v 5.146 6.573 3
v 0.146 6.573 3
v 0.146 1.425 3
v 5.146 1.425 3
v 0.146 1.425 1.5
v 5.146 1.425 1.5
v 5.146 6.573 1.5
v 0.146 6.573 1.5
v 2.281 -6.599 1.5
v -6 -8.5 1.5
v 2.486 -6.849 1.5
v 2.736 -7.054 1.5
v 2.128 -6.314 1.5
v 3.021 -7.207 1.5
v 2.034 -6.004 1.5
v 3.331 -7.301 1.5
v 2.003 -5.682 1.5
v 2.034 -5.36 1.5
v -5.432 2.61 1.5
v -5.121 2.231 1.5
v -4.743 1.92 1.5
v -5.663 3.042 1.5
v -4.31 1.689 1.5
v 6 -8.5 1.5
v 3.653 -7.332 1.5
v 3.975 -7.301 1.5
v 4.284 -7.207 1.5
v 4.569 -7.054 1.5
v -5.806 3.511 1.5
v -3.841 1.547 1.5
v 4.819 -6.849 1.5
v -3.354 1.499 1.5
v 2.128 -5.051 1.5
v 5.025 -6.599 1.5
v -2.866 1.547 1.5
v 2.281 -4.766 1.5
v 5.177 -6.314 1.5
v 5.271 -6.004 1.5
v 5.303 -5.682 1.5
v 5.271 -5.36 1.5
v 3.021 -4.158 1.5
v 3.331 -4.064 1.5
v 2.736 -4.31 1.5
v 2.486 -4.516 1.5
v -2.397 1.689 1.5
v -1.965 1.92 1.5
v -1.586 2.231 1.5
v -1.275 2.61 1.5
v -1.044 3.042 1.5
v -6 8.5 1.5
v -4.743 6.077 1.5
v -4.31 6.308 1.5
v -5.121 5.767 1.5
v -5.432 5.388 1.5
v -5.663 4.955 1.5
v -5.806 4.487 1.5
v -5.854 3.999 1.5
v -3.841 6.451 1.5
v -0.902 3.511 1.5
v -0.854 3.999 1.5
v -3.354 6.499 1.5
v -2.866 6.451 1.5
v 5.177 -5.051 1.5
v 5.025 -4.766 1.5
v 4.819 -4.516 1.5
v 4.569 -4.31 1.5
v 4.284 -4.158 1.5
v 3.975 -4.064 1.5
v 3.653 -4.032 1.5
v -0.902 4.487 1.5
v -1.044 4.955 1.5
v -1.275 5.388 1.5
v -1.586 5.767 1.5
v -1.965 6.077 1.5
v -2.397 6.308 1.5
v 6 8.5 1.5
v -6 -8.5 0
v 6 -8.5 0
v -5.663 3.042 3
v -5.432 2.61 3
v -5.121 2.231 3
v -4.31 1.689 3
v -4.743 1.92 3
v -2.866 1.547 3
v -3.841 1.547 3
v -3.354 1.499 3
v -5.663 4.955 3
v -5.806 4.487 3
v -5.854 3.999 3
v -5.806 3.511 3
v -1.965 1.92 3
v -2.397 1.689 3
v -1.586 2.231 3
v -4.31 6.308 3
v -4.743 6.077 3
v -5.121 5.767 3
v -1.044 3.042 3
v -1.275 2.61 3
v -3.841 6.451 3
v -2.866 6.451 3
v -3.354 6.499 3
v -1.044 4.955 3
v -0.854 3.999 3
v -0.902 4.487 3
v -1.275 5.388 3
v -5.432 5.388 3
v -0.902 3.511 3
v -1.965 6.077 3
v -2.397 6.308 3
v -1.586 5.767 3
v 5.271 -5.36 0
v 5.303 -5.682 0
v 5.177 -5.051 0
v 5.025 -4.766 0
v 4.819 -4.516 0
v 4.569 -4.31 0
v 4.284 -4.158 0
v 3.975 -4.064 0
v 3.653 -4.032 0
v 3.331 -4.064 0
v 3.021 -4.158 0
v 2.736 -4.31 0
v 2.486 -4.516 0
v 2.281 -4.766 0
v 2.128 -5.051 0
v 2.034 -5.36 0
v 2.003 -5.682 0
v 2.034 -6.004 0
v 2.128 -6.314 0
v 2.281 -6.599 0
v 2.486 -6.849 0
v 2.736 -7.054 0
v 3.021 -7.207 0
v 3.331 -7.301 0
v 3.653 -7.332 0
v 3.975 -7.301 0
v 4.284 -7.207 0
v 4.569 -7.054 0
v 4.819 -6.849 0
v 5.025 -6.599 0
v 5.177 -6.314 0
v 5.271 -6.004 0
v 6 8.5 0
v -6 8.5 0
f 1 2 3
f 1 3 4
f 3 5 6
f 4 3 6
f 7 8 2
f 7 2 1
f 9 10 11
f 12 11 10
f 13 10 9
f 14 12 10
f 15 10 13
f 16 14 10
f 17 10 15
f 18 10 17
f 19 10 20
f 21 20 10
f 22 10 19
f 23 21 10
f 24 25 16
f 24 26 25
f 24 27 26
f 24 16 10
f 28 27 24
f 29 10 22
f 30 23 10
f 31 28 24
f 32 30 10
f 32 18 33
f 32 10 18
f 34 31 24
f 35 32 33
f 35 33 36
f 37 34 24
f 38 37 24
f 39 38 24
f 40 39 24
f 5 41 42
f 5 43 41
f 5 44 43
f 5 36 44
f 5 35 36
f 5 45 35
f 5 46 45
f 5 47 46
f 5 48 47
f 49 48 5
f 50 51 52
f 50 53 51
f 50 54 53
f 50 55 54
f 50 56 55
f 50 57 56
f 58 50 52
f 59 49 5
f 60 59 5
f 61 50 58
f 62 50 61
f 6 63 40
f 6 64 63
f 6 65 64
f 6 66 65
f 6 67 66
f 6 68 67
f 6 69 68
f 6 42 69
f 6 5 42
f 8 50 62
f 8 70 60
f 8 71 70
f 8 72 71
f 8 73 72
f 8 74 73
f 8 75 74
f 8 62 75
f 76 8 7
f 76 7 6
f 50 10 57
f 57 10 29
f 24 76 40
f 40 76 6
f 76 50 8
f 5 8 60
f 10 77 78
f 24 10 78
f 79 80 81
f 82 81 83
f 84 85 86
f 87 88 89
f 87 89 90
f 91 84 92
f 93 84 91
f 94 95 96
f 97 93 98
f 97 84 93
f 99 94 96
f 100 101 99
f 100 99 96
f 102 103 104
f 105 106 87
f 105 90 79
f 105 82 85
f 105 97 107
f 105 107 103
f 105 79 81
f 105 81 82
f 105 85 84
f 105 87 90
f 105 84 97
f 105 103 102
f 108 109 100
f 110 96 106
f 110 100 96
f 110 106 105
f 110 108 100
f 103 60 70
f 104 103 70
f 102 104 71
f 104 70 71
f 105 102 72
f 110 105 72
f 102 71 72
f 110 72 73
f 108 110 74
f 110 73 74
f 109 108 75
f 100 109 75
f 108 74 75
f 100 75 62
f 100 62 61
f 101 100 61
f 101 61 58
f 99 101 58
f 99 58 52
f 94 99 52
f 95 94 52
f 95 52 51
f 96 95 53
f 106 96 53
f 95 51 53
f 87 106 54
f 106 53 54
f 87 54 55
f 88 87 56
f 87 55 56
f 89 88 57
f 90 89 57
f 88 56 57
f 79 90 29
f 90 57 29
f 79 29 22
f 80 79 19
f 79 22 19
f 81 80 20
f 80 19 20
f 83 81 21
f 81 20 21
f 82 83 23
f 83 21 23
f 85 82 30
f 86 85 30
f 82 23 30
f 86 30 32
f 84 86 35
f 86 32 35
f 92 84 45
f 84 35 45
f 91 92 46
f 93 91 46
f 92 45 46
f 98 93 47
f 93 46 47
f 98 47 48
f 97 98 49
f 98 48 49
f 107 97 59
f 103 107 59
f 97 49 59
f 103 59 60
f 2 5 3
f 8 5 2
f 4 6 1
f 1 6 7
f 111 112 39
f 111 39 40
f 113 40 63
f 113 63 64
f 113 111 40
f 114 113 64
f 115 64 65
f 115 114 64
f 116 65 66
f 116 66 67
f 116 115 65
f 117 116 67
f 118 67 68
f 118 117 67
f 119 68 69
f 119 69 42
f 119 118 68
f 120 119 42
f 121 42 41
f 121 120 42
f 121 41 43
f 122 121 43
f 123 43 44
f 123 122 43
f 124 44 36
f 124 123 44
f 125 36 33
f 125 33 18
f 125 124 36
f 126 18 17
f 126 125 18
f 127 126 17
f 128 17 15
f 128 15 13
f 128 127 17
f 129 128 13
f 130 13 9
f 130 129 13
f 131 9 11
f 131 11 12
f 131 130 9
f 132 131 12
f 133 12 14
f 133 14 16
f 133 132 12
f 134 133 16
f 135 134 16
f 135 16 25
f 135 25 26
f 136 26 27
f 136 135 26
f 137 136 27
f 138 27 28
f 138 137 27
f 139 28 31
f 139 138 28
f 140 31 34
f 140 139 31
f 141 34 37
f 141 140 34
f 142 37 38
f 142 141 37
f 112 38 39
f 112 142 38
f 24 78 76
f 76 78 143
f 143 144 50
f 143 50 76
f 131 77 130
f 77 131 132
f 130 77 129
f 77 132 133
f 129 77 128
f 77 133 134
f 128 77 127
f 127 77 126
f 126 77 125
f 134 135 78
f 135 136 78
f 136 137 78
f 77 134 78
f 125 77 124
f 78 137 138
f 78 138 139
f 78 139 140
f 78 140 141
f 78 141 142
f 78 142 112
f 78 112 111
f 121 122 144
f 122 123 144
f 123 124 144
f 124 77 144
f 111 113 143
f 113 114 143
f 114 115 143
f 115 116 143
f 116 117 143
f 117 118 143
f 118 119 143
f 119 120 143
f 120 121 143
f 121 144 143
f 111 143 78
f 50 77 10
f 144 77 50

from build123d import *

# Parameters (mm, degrees)
ESBO_O1_W                = 12
ESBO_O1_H                = 17
ESBO_O1_R                = 1.65
RESSALTO_EXTRUS_O1_DEPTH = 1.5
ESBO_O2_R                = 2.5
ESBO_O2_W                = 5
ESBO_O2_H                = 5.148031572
RESSALTO_EXTRUS_O2_DEPTH = 1.5


with BuildPart() as part:
    # Esboço1 → Ressalto-extrusão1 (new body)
    with BuildSketch(Plane.XY):
        Rectangle(ESBO_O1_W, ESBO_O1_H)
        with Locations((3.652764924, -5.682274929)):
            Circle(ESBO_O1_R, mode=Mode.SUBTRACT)
    extrude(amount=RESSALTO_EXTRUS_O1_DEPTH)

    # Esboço2 → Ressalto-extrusão2 (add)
    with BuildSketch(Plane.XY.offset(1.5)):
        with Locations((-3.353706204, 3.998787781)):
            Circle(ESBO_O2_R)
        with Locations((2.646293796, 3.998787781)):
            Rectangle(ESBO_O2_W, ESBO_O2_H)
    extrude(amount=RESSALTO_EXTRUS_O2_DEPTH)


solid = part.part
